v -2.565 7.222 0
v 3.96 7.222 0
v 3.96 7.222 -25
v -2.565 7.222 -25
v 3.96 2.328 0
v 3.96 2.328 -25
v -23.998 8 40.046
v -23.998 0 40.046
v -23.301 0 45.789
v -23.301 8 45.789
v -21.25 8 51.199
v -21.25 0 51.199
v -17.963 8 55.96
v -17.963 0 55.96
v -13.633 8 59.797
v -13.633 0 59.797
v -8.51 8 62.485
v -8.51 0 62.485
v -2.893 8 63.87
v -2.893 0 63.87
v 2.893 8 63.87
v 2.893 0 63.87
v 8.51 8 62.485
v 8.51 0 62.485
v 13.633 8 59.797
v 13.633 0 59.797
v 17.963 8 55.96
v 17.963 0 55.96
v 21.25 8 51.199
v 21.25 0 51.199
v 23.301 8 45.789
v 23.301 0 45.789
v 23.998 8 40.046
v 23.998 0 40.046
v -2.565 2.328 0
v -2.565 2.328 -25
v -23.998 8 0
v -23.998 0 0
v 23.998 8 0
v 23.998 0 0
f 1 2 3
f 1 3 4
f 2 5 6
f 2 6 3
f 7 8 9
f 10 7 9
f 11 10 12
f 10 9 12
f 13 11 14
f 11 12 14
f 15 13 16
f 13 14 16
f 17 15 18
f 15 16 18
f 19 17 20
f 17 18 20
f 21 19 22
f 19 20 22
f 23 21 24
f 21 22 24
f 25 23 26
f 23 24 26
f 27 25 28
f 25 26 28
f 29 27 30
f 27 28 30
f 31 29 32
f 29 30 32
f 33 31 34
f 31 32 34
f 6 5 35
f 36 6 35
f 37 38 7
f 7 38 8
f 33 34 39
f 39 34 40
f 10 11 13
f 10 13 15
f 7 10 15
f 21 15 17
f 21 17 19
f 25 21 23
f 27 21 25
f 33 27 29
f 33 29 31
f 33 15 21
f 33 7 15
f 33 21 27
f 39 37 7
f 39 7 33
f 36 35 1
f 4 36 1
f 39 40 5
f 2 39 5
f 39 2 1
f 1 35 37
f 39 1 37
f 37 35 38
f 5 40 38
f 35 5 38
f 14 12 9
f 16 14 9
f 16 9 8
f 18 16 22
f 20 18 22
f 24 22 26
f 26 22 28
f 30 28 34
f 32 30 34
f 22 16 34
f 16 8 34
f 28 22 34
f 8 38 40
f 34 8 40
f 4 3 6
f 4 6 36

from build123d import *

# Parameters (mm, degrees)
SALIENTE_EXTRUIR1_DEPTH = 8
CROQUIS2_W              = 6.524931815
CROQUIS2_H              = 4.893891774
SALIENTE_EXTRUIR2_DEPTH = 25


with BuildPart() as part:
    # Croquis1 → Saliente-Extruir1 (new body)
    with BuildSketch(Plane(origin=(0, 0, 0), x_dir=(1, 0, 0), z_dir=(0, 1, 0))):
        with BuildLine():
            Line((11.999210506, 0), (0, 0))
            Line((0, 0), (-11.999210506, 0))
            Line((-11.999210506, 0), (-23.998421012, 0))
            Line((-23.998421012, 0), (-23.998421012, -40.04621649))
            ThreePointArc((-23.998421012, -40.04621649), (0, -64.044637502), (23.998421012, -40.04621649))
            Line((23.998421012, -40.04621649), (23.998421012, 0))
            Line((23.998421012, 0), (11.999210506, 0))
        make_face()
    extrude(amount=SALIENTE_EXTRUIR1_DEPTH)

    # Croquis2 → Saliente-Extruir2 (add)
    with BuildSketch(Plane(origin=(0, 0, 0), x_dir=(-1, 0, 0), z_dir=(0, 0, -1))):
        with Locations((-0.697117267, 4.775150066)):
            Rectangle(CROQUIS2_W, CROQUIS2_H)
    extrude(amount=SALIENTE_EXTRUIR2_DEPTH)


solid = part.part
